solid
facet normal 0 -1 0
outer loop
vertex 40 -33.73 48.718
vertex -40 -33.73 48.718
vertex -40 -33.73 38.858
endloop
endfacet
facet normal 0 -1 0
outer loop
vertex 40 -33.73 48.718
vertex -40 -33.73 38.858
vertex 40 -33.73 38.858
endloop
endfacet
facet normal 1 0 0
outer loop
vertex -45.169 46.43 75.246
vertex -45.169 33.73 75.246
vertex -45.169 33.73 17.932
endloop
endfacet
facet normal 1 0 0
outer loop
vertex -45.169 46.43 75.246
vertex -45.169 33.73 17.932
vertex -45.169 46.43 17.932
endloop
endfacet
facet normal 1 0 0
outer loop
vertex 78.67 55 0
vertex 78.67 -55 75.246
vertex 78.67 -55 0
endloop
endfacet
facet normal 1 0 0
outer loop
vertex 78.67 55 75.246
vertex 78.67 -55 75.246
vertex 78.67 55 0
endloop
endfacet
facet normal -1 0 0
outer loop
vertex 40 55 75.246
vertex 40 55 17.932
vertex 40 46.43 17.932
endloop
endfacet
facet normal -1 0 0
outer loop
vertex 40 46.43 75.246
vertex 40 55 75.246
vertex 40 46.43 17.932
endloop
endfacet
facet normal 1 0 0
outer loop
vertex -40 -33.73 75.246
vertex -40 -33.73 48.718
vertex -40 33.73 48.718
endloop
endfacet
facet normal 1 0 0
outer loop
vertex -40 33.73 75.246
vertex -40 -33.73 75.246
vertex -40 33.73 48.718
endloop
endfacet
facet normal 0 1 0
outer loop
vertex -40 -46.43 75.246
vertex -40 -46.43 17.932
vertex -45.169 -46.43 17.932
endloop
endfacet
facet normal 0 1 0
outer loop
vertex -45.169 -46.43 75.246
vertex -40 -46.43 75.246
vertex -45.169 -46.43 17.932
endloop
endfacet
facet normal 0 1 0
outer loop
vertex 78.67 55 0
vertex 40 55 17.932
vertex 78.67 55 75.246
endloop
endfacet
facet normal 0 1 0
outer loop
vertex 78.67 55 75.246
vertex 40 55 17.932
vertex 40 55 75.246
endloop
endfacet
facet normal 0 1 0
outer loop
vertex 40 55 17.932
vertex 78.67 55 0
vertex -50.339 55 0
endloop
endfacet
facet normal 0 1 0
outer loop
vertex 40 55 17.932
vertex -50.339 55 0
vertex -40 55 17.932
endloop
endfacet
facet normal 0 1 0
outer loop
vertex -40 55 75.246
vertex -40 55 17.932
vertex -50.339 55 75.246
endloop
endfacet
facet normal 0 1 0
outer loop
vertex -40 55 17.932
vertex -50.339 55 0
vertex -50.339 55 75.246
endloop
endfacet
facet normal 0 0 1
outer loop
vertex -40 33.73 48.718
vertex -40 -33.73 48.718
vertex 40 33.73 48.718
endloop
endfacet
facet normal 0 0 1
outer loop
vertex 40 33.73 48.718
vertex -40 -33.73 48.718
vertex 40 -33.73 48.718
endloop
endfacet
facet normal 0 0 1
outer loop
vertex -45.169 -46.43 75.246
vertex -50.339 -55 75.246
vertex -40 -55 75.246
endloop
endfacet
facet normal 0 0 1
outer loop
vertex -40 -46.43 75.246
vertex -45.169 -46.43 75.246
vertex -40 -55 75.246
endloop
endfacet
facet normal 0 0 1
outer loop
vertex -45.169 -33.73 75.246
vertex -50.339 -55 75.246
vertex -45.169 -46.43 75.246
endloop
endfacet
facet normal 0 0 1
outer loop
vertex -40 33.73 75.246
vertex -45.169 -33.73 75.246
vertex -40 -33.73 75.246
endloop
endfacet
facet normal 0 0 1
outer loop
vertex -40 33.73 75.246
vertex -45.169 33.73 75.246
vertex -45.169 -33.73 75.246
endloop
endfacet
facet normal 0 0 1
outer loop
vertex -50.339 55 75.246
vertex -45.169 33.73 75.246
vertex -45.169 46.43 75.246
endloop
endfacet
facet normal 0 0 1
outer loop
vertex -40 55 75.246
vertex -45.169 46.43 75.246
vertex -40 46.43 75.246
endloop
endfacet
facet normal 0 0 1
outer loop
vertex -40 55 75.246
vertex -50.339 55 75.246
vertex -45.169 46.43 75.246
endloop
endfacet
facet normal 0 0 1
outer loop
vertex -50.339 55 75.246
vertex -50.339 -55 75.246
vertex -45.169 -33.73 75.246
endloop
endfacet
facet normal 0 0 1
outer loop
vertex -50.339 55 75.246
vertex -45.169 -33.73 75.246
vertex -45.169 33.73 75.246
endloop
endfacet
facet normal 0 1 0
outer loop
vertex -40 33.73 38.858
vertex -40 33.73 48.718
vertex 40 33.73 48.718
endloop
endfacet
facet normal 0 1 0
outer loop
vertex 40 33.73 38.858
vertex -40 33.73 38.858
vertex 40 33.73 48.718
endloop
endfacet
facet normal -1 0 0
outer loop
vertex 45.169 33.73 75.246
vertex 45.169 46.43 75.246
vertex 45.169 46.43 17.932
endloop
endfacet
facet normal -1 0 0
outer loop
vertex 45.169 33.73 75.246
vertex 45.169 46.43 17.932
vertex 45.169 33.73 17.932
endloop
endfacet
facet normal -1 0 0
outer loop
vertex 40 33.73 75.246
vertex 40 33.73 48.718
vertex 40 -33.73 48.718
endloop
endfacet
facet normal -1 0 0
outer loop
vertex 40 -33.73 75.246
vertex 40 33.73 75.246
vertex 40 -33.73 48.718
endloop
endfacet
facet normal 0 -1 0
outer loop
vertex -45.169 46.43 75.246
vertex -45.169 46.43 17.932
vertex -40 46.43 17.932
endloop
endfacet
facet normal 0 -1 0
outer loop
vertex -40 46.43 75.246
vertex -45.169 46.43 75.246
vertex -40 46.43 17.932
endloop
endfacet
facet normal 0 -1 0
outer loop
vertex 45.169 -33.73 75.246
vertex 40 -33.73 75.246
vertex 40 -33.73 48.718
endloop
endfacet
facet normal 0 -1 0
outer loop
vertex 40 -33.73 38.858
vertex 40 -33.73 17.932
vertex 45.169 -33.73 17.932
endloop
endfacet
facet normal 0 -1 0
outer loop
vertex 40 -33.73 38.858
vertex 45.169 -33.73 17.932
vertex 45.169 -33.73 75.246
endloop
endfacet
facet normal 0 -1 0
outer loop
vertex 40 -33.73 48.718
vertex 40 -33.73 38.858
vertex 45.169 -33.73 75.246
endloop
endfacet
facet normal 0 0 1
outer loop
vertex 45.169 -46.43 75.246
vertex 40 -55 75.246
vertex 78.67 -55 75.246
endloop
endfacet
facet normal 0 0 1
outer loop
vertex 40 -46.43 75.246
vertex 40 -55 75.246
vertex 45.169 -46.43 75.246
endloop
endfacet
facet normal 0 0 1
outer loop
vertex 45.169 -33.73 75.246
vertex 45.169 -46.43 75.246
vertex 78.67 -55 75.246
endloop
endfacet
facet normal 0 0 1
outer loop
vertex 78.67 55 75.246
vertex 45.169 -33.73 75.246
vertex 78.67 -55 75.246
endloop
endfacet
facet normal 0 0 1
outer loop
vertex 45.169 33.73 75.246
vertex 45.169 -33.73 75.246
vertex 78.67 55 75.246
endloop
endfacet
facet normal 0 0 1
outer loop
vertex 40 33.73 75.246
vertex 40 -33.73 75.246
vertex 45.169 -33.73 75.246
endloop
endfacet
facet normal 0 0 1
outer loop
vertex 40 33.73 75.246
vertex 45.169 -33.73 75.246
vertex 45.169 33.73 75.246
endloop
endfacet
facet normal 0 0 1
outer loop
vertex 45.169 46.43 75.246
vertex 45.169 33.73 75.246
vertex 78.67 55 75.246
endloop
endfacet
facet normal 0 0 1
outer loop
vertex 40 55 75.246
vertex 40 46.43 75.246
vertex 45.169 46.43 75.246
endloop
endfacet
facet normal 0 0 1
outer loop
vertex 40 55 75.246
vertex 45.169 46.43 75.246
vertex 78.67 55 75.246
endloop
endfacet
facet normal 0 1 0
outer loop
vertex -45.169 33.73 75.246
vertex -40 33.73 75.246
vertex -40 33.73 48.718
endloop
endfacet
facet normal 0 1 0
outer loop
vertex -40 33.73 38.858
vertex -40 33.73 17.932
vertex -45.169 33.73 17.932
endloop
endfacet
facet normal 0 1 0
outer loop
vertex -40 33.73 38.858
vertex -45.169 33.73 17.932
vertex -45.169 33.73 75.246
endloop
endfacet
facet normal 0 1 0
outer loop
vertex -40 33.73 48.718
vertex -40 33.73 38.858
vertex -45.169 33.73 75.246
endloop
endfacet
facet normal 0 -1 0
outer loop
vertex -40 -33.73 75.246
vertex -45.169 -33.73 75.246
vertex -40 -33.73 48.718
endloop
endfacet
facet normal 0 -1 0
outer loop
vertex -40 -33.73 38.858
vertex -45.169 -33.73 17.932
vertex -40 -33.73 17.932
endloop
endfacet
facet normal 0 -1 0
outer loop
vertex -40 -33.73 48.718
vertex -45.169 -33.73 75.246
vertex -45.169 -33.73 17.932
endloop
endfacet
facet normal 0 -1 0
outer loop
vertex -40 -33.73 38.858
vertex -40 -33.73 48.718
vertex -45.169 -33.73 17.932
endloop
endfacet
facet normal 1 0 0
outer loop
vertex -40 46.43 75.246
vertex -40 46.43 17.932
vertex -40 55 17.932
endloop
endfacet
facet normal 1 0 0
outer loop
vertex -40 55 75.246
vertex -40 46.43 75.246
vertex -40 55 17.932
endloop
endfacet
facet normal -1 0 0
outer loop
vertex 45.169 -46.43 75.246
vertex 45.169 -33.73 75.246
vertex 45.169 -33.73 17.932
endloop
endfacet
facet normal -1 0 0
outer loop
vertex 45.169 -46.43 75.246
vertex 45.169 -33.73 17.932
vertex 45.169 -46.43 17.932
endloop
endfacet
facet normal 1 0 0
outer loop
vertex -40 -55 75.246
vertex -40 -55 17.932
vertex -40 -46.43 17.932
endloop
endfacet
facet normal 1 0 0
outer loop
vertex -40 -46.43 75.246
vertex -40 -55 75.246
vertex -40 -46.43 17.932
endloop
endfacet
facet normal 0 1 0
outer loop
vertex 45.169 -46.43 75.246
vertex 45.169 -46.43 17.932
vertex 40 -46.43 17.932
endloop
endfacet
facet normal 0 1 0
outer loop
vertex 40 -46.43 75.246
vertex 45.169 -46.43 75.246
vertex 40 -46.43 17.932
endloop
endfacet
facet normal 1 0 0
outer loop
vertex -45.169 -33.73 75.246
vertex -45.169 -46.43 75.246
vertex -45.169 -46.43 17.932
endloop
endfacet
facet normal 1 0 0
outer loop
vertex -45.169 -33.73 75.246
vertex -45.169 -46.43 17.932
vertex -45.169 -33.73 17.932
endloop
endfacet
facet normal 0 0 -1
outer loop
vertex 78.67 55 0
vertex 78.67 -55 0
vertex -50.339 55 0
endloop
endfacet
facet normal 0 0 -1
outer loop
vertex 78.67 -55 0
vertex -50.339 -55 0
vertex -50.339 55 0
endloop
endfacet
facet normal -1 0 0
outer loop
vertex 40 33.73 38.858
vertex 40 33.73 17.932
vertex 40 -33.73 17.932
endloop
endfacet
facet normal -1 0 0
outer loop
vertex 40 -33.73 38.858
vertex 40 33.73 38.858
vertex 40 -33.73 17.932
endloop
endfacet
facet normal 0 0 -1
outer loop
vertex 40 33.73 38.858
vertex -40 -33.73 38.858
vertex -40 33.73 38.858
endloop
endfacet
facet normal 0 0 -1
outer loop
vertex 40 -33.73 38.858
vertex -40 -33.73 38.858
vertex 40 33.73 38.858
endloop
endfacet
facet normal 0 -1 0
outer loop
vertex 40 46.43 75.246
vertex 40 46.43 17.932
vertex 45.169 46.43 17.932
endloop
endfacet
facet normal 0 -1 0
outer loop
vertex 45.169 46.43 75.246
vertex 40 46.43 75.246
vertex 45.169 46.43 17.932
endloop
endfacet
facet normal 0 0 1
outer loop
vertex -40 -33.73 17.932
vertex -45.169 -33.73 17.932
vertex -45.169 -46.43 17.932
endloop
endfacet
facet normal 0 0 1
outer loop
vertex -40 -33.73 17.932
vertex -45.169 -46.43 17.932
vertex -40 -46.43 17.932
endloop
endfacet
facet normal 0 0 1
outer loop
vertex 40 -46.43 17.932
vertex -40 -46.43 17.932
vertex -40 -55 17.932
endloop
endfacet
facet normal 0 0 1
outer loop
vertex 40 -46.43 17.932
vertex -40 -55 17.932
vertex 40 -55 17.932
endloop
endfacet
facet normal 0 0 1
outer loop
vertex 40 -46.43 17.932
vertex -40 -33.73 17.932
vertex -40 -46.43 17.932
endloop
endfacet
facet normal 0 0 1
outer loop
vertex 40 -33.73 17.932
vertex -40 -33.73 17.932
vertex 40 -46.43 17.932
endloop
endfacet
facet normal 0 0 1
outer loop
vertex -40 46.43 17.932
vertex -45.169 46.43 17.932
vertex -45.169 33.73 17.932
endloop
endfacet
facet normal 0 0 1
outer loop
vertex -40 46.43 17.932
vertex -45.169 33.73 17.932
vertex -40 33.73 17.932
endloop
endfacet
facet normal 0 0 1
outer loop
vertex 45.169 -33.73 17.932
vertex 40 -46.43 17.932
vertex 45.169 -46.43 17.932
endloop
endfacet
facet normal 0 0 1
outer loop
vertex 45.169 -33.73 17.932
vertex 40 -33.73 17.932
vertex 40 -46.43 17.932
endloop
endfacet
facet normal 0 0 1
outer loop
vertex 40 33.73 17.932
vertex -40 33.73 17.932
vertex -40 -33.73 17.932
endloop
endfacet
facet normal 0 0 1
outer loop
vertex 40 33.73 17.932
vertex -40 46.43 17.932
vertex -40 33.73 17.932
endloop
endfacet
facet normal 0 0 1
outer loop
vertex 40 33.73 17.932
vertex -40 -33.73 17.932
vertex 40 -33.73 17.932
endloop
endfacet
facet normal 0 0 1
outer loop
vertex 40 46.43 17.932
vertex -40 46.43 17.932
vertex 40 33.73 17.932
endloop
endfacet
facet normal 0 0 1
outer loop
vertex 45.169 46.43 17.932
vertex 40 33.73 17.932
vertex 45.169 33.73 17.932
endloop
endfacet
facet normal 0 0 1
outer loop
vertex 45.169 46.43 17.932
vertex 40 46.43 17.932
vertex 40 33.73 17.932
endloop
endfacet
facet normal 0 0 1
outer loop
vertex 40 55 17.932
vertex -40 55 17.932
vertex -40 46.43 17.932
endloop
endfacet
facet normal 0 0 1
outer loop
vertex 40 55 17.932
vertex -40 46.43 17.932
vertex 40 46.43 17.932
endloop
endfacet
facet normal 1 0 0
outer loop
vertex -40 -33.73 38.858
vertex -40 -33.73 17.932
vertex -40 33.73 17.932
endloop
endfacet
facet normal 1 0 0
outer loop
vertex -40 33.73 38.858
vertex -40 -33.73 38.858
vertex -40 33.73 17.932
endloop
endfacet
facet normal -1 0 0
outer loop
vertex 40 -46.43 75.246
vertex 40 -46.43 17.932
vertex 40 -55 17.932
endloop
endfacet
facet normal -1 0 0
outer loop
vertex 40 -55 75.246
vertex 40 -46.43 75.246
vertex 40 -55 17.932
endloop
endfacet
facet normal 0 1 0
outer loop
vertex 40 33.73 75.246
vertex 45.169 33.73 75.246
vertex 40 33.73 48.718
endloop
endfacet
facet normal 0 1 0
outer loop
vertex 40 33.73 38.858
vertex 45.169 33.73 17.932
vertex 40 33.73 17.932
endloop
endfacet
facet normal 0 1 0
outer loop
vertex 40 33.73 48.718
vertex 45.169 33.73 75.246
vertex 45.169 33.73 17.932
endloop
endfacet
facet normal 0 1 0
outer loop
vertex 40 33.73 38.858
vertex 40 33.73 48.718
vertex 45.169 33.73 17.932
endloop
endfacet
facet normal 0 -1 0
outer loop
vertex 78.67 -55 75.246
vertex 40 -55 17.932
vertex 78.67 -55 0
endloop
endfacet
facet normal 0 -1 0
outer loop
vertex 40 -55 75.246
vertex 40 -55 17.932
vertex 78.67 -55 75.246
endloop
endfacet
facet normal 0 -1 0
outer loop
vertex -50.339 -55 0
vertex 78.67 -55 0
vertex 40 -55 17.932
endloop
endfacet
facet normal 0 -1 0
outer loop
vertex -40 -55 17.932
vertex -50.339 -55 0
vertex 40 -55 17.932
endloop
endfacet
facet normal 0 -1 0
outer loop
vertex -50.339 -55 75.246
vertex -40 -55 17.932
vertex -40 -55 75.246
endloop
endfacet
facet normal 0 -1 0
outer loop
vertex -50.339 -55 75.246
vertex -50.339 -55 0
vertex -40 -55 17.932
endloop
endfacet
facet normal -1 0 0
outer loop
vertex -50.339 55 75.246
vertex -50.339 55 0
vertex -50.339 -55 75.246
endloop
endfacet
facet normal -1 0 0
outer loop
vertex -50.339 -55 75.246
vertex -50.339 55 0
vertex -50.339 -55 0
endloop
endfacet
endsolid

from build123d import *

# Parameters (mm, degrees)
F1_DEPTH  = 17.93161
F2_DEPTH  = 75.24566
F3_W      = 80
F3_H      = 9.859875
F4_DEPTH  = 33.73
F2_FACE_W = 110
F2_FACE_H = 75.24566
F5_DEPTH  = 28.33094


with BuildPart() as f1:
    # F0 (on Top) → F1 (new body)
    with BuildSketch(Plane.XY):
        Polygon((-40, -55), (0, -55), (0, 0), (-40, 0), (-40, -33.72997), (-45.169481, -33.72997), (-45.169481, -46.42997), (-40, -46.42997), align=None)
        Polygon((0, 0), (0, -55), (40, -55), (40, -46.42997), (45.169481, -46.42997), (45.169481, -33.72997), (40, -33.72997), (40, 0), align=None)
        Polygon((-40, 0), (0, 0), (0, 55), (-40, 55), (-40, 46.42997), (-45.169481, 46.42997), (-45.169481, 33.72997), (-40, 33.72997), align=None)
        Polygon((0, 55), (0, 0), (40, 0), (40, 33.72997), (45.169481, 33.72997), (45.169481, 46.42997), (40, 46.42997), (40, 55), align=None)
        Polygon((-50.338964, -55), (-40, -55), (-40, -46.42997), (-45.169481, -46.42997), (-45.169481, -33.72997), (-40, -33.72997), (-40, 0), (-50.338964, 0), align=None)
        Polygon((40, -46.42997), (40, -55), (50.338964, -55), (50.338964, 0), (40, 0), (40, -33.72997), (45.169481, -33.72997), (45.169481, -46.42997), align=None)
        Polygon((40, 33.72997), (40, 0), (50.338964, 0), (50.338964, 55), (40, 55), (40, 46.42997), (45.169481, 46.42997), (45.169481, 33.72997), align=None)
        Polygon((-50.338964, 0), (-40, 0), (-40, 33.72997), (-45.169481, 33.72997), (-45.169481, 46.42997), (-40, 46.42997), (-40, 55), (-50.338964, 55), align=None)
    extrude(amount=F1_DEPTH)

    # F0 (on Top) → F2 (join)
    with BuildSketch(Plane.XY):
        Polygon((40, -46.42997), (40, -55), (50.338964, -55), (50.338964, 0), (40, 0), (40, -33.72997), (45.169481, -33.72997), (45.169481, -46.42997), align=None)
        Polygon((-50.338964, -55), (-40, -55), (-40, -46.42997), (-45.169481, -46.42997), (-45.169481, -33.72997), (-40, -33.72997), (-40, 0), (-50.338964, 0), align=None)
        Polygon((-50.338964, 0), (-40, 0), (-40, 33.72997), (-45.169481, 33.72997), (-45.169481, 46.42997), (-40, 46.42997), (-40, 55), (-50.338964, 55), align=None)
        Polygon((40, 33.72997), (40, 0), (50.338964, 0), (50.338964, 55), (40, 55), (40, 46.42997), (45.169481, 46.42997), (45.169481, 33.72997), align=None)
    extrude(amount=F2_DEPTH)

    # F3 (on Front) → F4 (join, symmetric)
    with BuildSketch(Plane.XZ):
        with Locations((0, 43.787974)):
            Rectangle(F3_W, F3_H)
    extrude(amount=F4_DEPTH, both=True)

    # F2_face (on face) → F5 (join)
    with BuildSketch(Plane(origin=(50.338964, 0, 37.62283), x_dir=(0, 1, 0), z_dir=(1, 0, 0))):
        Rectangle(F2_FACE_W, F2_FACE_H)
    extrude(amount=F5_DEPTH)


solid = f1.part
